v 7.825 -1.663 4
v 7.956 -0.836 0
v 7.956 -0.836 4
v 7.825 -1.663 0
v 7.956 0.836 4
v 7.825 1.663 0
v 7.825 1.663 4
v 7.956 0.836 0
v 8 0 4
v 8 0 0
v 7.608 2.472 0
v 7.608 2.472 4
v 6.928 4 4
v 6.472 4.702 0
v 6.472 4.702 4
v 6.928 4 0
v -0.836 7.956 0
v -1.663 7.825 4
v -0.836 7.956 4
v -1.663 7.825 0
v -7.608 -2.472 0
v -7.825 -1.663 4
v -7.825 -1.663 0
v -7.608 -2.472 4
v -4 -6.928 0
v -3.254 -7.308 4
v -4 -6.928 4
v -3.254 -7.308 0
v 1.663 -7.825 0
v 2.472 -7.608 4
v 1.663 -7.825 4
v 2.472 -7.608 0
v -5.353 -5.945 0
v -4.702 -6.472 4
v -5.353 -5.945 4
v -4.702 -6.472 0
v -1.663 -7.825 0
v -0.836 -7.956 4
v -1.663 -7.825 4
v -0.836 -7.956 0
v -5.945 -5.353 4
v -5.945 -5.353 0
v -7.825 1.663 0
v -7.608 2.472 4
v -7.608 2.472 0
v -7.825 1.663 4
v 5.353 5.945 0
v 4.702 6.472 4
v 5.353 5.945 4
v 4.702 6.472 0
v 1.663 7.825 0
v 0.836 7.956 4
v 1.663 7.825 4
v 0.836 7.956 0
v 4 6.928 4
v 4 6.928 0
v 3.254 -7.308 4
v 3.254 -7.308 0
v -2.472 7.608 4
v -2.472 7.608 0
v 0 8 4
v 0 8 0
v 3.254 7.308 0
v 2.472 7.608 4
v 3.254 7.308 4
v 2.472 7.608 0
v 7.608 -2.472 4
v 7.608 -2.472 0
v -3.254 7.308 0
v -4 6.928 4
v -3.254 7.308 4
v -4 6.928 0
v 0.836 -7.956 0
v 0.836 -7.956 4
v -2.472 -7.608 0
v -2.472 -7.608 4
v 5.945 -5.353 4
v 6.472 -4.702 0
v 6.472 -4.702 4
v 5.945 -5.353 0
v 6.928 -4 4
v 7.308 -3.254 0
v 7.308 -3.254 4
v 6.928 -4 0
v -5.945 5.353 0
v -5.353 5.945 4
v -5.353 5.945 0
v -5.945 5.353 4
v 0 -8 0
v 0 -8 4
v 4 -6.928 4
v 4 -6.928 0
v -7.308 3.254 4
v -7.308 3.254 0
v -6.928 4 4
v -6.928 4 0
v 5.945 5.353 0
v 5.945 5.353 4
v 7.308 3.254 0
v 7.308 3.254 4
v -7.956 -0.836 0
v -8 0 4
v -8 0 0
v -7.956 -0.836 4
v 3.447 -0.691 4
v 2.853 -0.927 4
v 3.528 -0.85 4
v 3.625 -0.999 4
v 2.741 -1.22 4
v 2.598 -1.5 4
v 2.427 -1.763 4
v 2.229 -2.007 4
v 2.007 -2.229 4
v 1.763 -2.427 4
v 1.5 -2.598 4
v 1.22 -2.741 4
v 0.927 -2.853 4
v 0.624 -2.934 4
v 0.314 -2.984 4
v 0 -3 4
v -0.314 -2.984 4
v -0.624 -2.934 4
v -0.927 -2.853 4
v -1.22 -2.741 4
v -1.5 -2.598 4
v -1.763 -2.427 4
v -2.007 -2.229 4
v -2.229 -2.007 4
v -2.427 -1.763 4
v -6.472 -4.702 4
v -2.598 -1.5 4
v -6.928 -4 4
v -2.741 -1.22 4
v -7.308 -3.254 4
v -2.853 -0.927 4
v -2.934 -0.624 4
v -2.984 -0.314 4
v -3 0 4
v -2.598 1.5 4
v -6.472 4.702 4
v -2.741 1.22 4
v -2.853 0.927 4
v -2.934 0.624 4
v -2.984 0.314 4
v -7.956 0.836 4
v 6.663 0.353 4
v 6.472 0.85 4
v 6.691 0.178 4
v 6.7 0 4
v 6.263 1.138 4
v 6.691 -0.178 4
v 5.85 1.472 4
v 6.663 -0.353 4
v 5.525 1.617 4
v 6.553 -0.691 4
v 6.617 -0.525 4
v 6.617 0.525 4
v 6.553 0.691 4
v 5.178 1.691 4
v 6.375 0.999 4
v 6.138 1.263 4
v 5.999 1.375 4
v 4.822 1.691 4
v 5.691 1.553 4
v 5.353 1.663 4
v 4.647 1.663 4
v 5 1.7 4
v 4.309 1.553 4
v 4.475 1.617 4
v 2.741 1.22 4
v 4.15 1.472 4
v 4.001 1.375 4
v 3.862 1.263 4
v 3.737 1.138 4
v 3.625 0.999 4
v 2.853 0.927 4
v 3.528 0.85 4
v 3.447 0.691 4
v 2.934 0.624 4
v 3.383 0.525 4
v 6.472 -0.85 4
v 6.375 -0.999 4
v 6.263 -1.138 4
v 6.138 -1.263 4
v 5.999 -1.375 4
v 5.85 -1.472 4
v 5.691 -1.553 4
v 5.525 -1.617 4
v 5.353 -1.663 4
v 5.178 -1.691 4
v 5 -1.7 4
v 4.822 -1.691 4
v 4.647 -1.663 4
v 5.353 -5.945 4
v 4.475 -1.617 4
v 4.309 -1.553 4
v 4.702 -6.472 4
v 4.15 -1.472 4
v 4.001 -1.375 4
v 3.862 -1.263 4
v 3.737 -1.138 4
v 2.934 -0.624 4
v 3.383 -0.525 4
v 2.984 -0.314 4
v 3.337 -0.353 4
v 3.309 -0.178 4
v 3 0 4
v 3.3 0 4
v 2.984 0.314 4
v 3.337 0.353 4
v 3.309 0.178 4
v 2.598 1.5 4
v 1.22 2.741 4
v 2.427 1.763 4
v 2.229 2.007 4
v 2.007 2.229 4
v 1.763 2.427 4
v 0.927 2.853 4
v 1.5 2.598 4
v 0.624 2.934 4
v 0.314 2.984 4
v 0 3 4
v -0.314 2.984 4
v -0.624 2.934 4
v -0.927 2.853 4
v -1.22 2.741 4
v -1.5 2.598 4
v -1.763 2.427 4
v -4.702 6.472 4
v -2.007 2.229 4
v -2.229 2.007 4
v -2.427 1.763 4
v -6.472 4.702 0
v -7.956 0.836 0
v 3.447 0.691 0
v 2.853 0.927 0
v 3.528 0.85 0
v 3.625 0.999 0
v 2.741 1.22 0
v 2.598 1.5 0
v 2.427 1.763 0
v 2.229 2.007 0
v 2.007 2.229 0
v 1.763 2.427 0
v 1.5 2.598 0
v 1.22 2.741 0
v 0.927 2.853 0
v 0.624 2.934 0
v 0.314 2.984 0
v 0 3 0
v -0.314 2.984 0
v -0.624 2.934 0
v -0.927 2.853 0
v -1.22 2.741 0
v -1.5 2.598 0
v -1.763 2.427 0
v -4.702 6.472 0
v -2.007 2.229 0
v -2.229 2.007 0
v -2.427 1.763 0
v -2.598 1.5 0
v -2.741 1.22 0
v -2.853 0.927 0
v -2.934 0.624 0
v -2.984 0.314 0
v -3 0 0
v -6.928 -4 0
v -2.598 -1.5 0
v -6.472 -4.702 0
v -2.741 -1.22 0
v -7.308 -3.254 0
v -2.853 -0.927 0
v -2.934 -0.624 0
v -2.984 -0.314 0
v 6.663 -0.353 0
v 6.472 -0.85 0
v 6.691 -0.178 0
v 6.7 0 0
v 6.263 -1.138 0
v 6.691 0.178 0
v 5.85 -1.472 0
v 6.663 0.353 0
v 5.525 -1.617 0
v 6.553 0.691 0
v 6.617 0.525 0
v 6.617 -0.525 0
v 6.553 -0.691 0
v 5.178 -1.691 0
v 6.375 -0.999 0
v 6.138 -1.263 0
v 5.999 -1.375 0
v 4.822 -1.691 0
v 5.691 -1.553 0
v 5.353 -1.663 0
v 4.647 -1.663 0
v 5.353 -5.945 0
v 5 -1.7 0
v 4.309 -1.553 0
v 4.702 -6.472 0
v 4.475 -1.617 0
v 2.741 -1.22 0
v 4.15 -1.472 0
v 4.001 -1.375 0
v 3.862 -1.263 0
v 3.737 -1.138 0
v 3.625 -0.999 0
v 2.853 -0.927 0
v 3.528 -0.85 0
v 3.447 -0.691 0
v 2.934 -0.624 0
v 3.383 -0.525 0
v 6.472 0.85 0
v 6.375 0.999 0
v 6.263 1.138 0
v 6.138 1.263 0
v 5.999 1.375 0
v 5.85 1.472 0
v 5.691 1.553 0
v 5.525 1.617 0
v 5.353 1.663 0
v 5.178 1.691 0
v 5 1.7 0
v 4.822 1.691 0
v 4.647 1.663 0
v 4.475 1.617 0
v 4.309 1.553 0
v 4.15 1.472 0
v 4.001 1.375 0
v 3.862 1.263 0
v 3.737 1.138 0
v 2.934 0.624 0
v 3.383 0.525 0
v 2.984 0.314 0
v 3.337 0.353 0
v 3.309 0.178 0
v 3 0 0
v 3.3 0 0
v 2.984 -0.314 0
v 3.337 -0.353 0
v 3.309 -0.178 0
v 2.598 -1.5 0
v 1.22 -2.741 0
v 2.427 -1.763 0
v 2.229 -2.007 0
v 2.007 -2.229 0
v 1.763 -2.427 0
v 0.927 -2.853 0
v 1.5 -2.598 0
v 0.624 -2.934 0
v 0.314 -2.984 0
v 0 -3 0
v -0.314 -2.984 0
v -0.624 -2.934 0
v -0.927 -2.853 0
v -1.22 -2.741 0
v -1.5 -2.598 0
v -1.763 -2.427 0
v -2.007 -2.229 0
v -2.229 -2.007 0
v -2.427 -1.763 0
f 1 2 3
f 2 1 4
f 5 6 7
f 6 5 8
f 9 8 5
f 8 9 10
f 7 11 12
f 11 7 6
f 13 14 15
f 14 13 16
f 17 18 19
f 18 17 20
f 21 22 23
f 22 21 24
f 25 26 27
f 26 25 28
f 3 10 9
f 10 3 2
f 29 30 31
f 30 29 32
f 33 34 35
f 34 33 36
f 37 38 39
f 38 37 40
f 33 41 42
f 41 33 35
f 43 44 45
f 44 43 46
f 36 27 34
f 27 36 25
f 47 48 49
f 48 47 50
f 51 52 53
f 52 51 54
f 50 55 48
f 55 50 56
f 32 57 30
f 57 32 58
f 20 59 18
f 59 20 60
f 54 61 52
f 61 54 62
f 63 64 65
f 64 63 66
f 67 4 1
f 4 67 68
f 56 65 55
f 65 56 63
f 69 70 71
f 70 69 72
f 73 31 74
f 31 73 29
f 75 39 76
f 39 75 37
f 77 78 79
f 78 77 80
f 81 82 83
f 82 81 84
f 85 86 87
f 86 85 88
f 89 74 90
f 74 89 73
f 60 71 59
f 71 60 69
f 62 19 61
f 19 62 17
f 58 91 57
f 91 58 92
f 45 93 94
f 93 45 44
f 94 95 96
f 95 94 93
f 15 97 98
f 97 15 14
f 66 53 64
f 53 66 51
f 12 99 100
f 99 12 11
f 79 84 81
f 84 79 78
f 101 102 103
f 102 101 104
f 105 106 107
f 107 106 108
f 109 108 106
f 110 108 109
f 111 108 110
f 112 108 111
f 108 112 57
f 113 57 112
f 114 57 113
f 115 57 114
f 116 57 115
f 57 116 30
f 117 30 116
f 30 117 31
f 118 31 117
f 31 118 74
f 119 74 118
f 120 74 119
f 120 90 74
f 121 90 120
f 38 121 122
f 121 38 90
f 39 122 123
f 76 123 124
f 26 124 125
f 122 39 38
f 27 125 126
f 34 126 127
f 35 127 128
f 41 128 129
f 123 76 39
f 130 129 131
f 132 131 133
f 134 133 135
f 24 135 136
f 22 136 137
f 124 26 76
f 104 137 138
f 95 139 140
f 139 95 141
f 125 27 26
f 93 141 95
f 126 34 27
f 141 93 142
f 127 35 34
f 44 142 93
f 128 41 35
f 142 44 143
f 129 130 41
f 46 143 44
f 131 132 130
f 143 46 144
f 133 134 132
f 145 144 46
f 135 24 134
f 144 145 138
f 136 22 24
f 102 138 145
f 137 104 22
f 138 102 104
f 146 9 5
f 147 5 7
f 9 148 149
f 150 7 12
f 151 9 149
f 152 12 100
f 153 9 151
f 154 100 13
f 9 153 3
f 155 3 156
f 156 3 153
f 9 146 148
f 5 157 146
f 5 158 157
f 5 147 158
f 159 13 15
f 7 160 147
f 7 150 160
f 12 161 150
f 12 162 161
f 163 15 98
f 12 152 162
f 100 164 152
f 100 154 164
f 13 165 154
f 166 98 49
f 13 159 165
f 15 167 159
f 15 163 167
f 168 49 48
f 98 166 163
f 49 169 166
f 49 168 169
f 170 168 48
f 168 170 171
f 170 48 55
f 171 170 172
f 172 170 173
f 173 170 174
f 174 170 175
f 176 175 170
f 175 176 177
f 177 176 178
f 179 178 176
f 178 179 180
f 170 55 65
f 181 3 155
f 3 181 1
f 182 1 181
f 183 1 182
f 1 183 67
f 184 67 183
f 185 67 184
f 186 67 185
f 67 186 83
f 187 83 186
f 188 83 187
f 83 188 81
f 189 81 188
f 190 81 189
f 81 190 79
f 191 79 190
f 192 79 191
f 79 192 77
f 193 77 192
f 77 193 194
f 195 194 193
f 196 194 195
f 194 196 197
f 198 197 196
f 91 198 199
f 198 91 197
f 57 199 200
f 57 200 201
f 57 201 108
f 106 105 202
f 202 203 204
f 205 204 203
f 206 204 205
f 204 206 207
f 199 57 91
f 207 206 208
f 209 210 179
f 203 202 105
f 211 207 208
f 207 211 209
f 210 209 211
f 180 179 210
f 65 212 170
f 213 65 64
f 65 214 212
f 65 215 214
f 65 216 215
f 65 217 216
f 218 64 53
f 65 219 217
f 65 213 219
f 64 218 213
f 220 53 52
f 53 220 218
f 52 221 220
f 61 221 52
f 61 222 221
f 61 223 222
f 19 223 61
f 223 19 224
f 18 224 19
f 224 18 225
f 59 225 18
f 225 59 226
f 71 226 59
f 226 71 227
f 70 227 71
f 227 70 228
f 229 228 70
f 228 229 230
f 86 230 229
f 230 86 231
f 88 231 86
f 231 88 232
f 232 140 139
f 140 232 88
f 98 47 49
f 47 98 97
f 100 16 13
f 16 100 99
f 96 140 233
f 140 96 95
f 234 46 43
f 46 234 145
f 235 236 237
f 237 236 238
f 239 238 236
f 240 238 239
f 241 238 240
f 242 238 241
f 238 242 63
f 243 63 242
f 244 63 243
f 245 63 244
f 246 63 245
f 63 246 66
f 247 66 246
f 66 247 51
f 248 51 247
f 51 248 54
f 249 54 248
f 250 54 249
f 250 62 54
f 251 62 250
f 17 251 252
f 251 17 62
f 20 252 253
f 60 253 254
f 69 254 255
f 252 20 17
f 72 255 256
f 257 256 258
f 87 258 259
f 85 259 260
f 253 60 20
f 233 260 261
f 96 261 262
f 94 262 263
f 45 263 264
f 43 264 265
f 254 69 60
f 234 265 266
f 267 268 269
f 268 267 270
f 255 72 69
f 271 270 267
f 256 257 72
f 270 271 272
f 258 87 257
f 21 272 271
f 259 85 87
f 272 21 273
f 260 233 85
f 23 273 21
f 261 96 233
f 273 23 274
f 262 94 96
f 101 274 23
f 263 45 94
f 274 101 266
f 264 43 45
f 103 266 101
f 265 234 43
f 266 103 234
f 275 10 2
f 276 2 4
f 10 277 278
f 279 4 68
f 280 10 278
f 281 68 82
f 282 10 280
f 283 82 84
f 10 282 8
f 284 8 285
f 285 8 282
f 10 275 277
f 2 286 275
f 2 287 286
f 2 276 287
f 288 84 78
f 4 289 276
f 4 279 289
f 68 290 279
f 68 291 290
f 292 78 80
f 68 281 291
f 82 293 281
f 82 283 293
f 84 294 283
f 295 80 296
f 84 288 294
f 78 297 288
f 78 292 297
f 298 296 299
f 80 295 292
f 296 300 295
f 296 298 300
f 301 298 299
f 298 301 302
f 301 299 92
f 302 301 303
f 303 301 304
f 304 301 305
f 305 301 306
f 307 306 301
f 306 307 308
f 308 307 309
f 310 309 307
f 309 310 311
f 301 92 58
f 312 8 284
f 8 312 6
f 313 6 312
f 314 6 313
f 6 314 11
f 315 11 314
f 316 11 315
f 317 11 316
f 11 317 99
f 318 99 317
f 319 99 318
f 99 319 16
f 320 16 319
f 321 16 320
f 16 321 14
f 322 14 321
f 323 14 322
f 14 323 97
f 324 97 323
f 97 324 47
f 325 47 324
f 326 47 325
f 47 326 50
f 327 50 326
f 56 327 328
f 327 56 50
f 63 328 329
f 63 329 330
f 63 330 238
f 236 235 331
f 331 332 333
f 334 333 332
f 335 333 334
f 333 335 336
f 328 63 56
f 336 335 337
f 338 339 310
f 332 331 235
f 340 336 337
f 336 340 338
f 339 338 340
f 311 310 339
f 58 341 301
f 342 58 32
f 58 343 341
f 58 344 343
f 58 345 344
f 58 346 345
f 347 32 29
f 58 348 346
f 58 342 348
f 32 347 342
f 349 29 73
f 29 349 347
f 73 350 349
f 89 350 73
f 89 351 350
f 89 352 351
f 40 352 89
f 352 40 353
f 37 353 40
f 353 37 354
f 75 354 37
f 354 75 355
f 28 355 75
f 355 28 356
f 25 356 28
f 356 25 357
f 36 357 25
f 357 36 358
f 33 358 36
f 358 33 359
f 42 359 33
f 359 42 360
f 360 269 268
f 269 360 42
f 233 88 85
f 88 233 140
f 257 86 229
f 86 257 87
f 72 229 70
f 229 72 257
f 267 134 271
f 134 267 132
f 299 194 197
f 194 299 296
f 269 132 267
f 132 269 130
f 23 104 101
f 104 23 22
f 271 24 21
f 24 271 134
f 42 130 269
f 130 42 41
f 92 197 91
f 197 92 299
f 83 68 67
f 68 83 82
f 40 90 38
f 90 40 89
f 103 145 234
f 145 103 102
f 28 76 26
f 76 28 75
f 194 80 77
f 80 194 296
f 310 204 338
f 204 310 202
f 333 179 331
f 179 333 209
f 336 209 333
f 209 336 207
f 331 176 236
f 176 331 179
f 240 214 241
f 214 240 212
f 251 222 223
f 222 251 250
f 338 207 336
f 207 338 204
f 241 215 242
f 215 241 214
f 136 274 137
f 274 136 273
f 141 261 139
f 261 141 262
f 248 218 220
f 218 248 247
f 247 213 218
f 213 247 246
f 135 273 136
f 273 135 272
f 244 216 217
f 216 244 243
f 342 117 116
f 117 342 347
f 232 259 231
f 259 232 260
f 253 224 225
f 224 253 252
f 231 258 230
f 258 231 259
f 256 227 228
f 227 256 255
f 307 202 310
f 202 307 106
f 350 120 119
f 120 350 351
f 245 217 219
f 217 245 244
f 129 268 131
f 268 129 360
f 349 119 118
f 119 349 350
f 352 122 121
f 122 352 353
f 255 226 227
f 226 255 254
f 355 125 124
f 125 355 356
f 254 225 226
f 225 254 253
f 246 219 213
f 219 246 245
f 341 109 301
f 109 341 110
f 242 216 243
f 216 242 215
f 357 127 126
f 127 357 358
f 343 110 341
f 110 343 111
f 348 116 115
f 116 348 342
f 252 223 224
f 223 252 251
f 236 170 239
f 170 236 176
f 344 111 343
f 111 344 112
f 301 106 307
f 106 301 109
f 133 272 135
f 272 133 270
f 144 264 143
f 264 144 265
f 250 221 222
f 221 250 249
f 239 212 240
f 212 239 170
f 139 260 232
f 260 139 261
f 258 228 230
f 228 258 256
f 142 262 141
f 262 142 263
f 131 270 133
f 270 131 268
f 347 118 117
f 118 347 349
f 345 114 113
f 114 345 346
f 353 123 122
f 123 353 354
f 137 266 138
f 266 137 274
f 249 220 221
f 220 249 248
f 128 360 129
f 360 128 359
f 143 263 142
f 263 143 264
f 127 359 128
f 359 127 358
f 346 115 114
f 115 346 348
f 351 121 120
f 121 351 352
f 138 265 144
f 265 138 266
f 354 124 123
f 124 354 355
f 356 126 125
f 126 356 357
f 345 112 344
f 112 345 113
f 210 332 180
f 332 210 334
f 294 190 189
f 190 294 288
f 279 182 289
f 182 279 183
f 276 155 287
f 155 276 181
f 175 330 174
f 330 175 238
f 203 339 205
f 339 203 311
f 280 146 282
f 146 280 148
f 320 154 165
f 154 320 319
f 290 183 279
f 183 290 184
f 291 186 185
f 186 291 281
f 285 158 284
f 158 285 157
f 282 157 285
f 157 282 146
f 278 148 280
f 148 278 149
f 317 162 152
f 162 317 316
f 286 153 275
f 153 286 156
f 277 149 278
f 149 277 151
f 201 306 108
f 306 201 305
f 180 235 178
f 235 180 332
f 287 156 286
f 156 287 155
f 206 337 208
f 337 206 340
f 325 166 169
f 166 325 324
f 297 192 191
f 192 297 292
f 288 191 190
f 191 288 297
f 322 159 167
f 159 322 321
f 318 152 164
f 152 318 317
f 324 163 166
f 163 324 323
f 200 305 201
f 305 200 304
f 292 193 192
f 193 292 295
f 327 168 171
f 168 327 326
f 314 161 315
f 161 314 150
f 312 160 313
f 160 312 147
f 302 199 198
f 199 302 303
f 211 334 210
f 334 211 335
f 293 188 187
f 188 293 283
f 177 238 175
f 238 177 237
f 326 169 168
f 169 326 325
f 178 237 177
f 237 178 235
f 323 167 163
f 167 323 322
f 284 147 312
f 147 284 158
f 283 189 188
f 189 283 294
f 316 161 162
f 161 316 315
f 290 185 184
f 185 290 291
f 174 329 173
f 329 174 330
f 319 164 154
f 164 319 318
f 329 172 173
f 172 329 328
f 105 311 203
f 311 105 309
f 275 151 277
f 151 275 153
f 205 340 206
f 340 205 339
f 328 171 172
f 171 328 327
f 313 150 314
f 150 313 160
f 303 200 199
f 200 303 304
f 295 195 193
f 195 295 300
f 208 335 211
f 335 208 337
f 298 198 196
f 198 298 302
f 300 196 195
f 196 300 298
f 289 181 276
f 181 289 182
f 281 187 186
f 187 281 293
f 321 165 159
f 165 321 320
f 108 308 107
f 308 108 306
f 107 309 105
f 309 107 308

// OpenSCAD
// Closed cable guide ring.
$fn = 60;
eps = 0.02;
cable_d = 6;
outer_d = 16;
thickness = 4;
difference() { cylinder(d=outer_d,h=thickness); translate([0,0,-eps]) cylinder(d=cable_d,h=thickness+2*eps); translate([outer_d/2-3,0,-eps]) cylinder(d=3.4,h=thickness+2*eps); }
